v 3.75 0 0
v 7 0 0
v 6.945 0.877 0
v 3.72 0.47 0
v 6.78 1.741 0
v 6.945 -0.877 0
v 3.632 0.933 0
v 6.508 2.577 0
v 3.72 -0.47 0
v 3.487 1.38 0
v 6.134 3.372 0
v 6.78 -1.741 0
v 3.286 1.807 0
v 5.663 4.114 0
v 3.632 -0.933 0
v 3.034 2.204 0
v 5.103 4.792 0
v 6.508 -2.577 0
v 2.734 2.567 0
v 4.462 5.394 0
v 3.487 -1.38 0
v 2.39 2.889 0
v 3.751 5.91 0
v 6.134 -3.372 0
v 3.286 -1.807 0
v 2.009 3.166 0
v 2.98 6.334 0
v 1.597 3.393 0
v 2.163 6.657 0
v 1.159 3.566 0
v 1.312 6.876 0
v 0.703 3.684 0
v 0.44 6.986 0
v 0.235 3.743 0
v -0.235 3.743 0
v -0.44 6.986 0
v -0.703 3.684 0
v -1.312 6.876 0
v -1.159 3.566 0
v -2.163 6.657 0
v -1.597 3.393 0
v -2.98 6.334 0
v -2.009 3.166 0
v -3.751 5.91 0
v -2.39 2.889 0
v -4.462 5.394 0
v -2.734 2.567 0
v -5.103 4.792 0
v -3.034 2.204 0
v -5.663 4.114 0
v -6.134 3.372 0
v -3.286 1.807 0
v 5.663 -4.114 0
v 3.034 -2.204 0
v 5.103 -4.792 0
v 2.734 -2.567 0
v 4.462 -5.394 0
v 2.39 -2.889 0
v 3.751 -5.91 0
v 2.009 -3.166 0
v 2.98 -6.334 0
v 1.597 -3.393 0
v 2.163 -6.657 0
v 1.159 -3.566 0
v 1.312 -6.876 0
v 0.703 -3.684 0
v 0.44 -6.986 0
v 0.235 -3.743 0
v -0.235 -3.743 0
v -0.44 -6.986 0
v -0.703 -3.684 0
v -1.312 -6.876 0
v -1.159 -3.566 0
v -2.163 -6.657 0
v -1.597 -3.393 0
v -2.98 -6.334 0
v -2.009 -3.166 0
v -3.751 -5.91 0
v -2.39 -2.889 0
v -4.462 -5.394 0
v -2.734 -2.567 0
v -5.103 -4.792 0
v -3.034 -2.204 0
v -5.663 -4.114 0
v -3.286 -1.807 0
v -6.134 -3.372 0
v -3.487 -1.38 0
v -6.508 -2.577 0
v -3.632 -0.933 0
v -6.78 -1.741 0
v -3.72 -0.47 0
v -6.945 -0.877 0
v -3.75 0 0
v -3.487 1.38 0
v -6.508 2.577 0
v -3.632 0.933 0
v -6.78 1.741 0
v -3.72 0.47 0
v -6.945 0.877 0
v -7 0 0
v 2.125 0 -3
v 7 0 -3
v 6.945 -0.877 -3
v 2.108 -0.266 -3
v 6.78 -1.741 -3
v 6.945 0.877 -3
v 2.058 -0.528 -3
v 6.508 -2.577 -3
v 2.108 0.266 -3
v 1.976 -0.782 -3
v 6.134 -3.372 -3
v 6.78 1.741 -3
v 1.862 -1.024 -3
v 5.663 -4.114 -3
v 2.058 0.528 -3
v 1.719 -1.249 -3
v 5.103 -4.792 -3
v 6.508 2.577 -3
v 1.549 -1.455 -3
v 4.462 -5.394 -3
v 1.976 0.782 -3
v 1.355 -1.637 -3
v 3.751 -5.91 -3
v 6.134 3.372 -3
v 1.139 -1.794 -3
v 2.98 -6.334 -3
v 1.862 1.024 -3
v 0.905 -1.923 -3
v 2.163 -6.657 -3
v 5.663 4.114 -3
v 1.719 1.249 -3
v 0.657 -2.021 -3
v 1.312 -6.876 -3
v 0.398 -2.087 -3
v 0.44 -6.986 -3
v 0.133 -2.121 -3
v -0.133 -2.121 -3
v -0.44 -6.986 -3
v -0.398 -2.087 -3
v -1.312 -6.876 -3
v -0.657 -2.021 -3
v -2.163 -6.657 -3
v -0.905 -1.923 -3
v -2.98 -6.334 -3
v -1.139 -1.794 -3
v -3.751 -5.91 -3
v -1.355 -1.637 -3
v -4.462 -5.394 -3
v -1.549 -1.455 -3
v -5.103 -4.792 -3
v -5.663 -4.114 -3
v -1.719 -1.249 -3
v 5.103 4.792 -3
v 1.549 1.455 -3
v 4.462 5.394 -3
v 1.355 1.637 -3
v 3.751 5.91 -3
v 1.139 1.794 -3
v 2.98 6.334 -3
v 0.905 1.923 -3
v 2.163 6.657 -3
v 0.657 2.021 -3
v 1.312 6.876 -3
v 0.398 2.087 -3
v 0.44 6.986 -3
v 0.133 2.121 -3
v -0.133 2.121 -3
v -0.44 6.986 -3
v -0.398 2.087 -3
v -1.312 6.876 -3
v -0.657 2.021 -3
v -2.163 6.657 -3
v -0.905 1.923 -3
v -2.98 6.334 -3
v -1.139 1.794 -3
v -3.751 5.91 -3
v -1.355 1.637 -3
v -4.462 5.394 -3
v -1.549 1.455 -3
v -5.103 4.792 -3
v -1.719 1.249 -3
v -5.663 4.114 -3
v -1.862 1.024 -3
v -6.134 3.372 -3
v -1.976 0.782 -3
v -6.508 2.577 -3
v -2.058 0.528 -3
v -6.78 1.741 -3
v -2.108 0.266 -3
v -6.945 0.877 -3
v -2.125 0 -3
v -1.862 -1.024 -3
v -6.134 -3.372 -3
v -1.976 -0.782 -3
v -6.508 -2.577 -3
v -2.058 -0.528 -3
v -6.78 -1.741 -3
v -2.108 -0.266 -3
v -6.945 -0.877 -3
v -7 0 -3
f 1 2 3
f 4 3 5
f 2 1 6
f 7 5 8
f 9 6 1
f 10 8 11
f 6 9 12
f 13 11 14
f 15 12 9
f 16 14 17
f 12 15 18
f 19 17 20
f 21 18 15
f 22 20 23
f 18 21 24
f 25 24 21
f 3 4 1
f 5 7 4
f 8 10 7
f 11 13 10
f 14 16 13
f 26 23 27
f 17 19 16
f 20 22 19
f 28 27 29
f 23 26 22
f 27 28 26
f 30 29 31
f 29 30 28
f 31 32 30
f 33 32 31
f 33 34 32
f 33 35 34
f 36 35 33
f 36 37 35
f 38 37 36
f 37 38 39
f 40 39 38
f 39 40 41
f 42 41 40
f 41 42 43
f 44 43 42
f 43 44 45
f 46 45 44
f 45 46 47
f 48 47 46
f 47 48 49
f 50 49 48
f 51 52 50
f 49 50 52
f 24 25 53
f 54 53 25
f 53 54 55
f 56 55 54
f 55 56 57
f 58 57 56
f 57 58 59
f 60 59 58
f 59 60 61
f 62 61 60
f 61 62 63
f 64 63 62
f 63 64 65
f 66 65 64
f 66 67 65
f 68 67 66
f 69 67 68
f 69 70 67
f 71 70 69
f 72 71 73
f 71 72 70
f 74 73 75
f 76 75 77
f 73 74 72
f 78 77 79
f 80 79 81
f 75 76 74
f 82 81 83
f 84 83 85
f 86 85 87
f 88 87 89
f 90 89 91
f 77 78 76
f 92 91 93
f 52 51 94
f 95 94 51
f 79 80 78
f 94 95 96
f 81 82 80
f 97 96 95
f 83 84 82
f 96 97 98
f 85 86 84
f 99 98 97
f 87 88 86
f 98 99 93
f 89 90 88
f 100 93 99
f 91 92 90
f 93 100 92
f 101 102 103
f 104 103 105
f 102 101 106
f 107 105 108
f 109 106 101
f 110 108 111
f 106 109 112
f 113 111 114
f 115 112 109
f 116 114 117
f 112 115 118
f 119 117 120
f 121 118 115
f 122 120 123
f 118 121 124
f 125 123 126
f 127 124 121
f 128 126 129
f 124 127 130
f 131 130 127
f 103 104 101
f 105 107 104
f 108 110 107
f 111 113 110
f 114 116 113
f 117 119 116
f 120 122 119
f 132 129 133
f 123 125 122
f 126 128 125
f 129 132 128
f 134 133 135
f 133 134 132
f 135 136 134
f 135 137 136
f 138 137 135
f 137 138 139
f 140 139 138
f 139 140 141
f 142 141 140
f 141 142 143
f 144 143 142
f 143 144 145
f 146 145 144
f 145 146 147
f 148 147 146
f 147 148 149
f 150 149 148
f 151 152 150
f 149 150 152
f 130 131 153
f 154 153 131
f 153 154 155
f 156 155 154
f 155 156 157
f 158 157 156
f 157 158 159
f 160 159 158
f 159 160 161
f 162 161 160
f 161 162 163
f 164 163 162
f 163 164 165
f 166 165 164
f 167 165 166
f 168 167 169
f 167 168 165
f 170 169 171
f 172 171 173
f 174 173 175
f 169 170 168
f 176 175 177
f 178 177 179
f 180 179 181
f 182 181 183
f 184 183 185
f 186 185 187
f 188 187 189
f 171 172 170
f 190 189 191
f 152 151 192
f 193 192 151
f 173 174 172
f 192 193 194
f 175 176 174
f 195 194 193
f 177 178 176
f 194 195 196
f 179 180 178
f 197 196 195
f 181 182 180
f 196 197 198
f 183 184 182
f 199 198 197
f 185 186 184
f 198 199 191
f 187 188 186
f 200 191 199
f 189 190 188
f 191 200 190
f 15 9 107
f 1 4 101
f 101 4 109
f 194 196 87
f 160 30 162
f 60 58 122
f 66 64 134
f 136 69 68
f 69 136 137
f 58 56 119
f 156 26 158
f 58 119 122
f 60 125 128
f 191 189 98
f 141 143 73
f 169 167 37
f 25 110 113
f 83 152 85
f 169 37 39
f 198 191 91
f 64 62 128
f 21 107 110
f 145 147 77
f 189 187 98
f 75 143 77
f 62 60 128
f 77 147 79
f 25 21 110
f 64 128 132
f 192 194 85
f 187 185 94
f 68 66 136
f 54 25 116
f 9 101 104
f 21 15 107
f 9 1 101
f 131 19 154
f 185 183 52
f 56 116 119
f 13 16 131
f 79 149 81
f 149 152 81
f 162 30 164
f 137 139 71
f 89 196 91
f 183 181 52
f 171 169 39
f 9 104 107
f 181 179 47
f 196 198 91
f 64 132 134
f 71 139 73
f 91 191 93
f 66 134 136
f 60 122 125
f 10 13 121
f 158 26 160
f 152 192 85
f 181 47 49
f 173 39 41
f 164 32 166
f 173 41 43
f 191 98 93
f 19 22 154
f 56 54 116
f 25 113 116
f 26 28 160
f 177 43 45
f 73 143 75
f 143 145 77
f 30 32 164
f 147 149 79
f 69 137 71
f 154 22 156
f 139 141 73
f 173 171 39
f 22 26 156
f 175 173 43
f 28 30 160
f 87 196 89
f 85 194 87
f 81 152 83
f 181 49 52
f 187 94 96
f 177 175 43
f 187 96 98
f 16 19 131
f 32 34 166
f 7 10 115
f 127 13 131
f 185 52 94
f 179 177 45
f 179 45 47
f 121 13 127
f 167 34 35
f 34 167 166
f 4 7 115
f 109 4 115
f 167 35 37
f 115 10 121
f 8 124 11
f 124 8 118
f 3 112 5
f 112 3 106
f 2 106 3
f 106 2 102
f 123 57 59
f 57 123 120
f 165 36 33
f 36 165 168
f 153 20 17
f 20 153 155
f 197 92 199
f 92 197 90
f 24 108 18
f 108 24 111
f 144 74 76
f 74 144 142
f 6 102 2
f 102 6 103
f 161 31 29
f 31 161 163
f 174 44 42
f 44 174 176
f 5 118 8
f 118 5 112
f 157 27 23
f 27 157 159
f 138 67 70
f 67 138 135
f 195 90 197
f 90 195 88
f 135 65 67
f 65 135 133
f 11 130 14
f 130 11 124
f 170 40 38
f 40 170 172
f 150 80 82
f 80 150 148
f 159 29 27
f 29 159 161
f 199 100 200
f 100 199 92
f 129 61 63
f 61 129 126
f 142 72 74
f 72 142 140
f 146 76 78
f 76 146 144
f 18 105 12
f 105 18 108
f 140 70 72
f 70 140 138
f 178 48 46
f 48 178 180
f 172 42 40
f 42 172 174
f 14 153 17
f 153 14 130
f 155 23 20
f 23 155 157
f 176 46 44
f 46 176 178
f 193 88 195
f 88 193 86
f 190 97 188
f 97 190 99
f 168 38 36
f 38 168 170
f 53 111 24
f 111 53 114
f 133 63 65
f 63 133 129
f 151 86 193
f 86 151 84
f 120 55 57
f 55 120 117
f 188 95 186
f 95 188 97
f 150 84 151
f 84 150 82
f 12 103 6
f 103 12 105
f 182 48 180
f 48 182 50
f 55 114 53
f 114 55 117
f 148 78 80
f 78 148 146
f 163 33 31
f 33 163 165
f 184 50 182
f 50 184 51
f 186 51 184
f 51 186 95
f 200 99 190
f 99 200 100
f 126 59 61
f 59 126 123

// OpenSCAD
$fn = 50;


difference() {
	union() {
		translate(v = [0, 0, -3.0000000000]) {
			cylinder(h = 3, r = 7.0000000000);
		}
	}
	union() {
		translate(v = [0, 0, 0]) {
			rotate(a = [0, 0, 0]) {
				difference() {
					union() {
						#translate(v = [0, 0, -3.0000000000]) {
							cylinder(h = 3, r = 2.0000000000);
						}
						#translate(v = [0, 0, -3]) {
							cylinder(h = 3, r = 7.0000000000, r1 = 2.1250000000, r2 = 3.7500000000);
						}
						#translate(v = [0, 0, -3.0000000000]) {
							cylinder(h = 3, r = 2.1250000000);
						}
						#translate(v = [0, 0, -3.0000000000]) {
							cylinder(h = 3, r = 2.0000000000);
						}
					}
					union();
				}
			}
		}
	}
}
